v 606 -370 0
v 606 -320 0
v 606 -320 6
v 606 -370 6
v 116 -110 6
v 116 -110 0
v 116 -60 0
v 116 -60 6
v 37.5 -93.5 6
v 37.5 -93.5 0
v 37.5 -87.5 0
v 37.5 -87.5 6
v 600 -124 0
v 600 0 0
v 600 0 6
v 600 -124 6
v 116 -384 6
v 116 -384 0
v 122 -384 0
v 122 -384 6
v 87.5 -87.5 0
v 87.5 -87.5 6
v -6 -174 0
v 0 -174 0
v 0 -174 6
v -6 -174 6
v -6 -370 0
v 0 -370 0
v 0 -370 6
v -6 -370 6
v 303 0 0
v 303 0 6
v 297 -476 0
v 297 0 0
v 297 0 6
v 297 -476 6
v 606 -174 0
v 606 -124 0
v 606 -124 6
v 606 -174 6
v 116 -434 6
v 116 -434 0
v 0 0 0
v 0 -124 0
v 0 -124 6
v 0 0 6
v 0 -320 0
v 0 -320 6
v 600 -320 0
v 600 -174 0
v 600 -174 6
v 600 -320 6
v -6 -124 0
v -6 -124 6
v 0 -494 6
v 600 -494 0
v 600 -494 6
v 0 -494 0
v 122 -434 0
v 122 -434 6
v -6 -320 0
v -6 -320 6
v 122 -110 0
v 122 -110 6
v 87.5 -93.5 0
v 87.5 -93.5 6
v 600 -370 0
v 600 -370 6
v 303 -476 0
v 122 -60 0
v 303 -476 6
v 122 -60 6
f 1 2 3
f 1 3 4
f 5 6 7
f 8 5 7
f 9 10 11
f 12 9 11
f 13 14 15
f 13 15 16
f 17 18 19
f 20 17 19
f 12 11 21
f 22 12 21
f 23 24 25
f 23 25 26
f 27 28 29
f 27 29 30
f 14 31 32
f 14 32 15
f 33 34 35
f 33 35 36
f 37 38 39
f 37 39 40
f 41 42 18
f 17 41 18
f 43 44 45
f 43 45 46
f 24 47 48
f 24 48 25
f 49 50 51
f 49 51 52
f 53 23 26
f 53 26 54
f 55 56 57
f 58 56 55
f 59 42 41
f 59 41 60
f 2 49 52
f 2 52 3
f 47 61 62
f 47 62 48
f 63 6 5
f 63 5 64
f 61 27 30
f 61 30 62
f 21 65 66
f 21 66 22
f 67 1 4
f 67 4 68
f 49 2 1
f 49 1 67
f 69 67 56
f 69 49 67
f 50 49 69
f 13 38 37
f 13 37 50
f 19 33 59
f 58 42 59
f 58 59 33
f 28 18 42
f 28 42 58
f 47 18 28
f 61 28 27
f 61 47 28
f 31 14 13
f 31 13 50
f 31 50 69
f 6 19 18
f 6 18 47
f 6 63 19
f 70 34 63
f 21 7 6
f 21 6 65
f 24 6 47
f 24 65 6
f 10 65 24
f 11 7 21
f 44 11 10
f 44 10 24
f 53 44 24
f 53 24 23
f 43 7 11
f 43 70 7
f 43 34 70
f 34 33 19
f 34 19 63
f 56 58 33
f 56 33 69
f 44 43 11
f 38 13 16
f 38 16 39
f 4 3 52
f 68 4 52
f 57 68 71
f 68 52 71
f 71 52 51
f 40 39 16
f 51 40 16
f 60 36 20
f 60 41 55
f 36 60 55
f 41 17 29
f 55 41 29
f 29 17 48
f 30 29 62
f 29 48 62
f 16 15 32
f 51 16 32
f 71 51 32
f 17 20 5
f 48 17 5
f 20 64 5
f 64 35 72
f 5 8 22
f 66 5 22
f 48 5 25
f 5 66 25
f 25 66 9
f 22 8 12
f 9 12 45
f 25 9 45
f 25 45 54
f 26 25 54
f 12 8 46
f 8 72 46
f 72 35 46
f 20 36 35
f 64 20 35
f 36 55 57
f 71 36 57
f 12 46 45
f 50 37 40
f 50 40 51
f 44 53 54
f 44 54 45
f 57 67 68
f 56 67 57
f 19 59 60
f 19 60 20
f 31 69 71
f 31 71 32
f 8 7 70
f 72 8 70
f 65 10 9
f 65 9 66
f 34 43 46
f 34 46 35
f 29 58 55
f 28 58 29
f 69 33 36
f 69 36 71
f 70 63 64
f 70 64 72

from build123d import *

# Parameters (mm, degrees)
SKETCH1_W           = 6
SKETCH1_H           = 50
SKETCH1_W_2         = 50
SKETCH1_H_2         = 6
BOSS_EXTRUDE1_DEPTH = 6


with BuildPart() as part:
    # Sketch1 → Boss-Extrude1 (new body)
    with BuildSketch(Plane.XY):
        Polygon((0, 0), (297, 0), (297, -476), (303, -476), (303, 0), (600, 0), (600, -124), (606, -124), (606, -174), (600, -174), (600, -320), (606, -320), (606, -370), (600, -370), (600, -494), (0, -494), (0, -370), (-6, -370), (-6, -320), (0, -320), (0, -174), (-6, -174), (-6, -124), (0, -124), align=None)
        with Locations((119, -409)):
            Rectangle(SKETCH1_W, SKETCH1_H, mode=Mode.SUBTRACT)
        with Locations((119, -85)):
            Rectangle(SKETCH1_W, SKETCH1_H, mode=Mode.SUBTRACT)
        with Locations((62.5, -90.5)):
            Rectangle(SKETCH1_W_2, SKETCH1_H_2, mode=Mode.SUBTRACT)
    extrude(amount=BOSS_EXTRUDE1_DEPTH)


solid = part.part
